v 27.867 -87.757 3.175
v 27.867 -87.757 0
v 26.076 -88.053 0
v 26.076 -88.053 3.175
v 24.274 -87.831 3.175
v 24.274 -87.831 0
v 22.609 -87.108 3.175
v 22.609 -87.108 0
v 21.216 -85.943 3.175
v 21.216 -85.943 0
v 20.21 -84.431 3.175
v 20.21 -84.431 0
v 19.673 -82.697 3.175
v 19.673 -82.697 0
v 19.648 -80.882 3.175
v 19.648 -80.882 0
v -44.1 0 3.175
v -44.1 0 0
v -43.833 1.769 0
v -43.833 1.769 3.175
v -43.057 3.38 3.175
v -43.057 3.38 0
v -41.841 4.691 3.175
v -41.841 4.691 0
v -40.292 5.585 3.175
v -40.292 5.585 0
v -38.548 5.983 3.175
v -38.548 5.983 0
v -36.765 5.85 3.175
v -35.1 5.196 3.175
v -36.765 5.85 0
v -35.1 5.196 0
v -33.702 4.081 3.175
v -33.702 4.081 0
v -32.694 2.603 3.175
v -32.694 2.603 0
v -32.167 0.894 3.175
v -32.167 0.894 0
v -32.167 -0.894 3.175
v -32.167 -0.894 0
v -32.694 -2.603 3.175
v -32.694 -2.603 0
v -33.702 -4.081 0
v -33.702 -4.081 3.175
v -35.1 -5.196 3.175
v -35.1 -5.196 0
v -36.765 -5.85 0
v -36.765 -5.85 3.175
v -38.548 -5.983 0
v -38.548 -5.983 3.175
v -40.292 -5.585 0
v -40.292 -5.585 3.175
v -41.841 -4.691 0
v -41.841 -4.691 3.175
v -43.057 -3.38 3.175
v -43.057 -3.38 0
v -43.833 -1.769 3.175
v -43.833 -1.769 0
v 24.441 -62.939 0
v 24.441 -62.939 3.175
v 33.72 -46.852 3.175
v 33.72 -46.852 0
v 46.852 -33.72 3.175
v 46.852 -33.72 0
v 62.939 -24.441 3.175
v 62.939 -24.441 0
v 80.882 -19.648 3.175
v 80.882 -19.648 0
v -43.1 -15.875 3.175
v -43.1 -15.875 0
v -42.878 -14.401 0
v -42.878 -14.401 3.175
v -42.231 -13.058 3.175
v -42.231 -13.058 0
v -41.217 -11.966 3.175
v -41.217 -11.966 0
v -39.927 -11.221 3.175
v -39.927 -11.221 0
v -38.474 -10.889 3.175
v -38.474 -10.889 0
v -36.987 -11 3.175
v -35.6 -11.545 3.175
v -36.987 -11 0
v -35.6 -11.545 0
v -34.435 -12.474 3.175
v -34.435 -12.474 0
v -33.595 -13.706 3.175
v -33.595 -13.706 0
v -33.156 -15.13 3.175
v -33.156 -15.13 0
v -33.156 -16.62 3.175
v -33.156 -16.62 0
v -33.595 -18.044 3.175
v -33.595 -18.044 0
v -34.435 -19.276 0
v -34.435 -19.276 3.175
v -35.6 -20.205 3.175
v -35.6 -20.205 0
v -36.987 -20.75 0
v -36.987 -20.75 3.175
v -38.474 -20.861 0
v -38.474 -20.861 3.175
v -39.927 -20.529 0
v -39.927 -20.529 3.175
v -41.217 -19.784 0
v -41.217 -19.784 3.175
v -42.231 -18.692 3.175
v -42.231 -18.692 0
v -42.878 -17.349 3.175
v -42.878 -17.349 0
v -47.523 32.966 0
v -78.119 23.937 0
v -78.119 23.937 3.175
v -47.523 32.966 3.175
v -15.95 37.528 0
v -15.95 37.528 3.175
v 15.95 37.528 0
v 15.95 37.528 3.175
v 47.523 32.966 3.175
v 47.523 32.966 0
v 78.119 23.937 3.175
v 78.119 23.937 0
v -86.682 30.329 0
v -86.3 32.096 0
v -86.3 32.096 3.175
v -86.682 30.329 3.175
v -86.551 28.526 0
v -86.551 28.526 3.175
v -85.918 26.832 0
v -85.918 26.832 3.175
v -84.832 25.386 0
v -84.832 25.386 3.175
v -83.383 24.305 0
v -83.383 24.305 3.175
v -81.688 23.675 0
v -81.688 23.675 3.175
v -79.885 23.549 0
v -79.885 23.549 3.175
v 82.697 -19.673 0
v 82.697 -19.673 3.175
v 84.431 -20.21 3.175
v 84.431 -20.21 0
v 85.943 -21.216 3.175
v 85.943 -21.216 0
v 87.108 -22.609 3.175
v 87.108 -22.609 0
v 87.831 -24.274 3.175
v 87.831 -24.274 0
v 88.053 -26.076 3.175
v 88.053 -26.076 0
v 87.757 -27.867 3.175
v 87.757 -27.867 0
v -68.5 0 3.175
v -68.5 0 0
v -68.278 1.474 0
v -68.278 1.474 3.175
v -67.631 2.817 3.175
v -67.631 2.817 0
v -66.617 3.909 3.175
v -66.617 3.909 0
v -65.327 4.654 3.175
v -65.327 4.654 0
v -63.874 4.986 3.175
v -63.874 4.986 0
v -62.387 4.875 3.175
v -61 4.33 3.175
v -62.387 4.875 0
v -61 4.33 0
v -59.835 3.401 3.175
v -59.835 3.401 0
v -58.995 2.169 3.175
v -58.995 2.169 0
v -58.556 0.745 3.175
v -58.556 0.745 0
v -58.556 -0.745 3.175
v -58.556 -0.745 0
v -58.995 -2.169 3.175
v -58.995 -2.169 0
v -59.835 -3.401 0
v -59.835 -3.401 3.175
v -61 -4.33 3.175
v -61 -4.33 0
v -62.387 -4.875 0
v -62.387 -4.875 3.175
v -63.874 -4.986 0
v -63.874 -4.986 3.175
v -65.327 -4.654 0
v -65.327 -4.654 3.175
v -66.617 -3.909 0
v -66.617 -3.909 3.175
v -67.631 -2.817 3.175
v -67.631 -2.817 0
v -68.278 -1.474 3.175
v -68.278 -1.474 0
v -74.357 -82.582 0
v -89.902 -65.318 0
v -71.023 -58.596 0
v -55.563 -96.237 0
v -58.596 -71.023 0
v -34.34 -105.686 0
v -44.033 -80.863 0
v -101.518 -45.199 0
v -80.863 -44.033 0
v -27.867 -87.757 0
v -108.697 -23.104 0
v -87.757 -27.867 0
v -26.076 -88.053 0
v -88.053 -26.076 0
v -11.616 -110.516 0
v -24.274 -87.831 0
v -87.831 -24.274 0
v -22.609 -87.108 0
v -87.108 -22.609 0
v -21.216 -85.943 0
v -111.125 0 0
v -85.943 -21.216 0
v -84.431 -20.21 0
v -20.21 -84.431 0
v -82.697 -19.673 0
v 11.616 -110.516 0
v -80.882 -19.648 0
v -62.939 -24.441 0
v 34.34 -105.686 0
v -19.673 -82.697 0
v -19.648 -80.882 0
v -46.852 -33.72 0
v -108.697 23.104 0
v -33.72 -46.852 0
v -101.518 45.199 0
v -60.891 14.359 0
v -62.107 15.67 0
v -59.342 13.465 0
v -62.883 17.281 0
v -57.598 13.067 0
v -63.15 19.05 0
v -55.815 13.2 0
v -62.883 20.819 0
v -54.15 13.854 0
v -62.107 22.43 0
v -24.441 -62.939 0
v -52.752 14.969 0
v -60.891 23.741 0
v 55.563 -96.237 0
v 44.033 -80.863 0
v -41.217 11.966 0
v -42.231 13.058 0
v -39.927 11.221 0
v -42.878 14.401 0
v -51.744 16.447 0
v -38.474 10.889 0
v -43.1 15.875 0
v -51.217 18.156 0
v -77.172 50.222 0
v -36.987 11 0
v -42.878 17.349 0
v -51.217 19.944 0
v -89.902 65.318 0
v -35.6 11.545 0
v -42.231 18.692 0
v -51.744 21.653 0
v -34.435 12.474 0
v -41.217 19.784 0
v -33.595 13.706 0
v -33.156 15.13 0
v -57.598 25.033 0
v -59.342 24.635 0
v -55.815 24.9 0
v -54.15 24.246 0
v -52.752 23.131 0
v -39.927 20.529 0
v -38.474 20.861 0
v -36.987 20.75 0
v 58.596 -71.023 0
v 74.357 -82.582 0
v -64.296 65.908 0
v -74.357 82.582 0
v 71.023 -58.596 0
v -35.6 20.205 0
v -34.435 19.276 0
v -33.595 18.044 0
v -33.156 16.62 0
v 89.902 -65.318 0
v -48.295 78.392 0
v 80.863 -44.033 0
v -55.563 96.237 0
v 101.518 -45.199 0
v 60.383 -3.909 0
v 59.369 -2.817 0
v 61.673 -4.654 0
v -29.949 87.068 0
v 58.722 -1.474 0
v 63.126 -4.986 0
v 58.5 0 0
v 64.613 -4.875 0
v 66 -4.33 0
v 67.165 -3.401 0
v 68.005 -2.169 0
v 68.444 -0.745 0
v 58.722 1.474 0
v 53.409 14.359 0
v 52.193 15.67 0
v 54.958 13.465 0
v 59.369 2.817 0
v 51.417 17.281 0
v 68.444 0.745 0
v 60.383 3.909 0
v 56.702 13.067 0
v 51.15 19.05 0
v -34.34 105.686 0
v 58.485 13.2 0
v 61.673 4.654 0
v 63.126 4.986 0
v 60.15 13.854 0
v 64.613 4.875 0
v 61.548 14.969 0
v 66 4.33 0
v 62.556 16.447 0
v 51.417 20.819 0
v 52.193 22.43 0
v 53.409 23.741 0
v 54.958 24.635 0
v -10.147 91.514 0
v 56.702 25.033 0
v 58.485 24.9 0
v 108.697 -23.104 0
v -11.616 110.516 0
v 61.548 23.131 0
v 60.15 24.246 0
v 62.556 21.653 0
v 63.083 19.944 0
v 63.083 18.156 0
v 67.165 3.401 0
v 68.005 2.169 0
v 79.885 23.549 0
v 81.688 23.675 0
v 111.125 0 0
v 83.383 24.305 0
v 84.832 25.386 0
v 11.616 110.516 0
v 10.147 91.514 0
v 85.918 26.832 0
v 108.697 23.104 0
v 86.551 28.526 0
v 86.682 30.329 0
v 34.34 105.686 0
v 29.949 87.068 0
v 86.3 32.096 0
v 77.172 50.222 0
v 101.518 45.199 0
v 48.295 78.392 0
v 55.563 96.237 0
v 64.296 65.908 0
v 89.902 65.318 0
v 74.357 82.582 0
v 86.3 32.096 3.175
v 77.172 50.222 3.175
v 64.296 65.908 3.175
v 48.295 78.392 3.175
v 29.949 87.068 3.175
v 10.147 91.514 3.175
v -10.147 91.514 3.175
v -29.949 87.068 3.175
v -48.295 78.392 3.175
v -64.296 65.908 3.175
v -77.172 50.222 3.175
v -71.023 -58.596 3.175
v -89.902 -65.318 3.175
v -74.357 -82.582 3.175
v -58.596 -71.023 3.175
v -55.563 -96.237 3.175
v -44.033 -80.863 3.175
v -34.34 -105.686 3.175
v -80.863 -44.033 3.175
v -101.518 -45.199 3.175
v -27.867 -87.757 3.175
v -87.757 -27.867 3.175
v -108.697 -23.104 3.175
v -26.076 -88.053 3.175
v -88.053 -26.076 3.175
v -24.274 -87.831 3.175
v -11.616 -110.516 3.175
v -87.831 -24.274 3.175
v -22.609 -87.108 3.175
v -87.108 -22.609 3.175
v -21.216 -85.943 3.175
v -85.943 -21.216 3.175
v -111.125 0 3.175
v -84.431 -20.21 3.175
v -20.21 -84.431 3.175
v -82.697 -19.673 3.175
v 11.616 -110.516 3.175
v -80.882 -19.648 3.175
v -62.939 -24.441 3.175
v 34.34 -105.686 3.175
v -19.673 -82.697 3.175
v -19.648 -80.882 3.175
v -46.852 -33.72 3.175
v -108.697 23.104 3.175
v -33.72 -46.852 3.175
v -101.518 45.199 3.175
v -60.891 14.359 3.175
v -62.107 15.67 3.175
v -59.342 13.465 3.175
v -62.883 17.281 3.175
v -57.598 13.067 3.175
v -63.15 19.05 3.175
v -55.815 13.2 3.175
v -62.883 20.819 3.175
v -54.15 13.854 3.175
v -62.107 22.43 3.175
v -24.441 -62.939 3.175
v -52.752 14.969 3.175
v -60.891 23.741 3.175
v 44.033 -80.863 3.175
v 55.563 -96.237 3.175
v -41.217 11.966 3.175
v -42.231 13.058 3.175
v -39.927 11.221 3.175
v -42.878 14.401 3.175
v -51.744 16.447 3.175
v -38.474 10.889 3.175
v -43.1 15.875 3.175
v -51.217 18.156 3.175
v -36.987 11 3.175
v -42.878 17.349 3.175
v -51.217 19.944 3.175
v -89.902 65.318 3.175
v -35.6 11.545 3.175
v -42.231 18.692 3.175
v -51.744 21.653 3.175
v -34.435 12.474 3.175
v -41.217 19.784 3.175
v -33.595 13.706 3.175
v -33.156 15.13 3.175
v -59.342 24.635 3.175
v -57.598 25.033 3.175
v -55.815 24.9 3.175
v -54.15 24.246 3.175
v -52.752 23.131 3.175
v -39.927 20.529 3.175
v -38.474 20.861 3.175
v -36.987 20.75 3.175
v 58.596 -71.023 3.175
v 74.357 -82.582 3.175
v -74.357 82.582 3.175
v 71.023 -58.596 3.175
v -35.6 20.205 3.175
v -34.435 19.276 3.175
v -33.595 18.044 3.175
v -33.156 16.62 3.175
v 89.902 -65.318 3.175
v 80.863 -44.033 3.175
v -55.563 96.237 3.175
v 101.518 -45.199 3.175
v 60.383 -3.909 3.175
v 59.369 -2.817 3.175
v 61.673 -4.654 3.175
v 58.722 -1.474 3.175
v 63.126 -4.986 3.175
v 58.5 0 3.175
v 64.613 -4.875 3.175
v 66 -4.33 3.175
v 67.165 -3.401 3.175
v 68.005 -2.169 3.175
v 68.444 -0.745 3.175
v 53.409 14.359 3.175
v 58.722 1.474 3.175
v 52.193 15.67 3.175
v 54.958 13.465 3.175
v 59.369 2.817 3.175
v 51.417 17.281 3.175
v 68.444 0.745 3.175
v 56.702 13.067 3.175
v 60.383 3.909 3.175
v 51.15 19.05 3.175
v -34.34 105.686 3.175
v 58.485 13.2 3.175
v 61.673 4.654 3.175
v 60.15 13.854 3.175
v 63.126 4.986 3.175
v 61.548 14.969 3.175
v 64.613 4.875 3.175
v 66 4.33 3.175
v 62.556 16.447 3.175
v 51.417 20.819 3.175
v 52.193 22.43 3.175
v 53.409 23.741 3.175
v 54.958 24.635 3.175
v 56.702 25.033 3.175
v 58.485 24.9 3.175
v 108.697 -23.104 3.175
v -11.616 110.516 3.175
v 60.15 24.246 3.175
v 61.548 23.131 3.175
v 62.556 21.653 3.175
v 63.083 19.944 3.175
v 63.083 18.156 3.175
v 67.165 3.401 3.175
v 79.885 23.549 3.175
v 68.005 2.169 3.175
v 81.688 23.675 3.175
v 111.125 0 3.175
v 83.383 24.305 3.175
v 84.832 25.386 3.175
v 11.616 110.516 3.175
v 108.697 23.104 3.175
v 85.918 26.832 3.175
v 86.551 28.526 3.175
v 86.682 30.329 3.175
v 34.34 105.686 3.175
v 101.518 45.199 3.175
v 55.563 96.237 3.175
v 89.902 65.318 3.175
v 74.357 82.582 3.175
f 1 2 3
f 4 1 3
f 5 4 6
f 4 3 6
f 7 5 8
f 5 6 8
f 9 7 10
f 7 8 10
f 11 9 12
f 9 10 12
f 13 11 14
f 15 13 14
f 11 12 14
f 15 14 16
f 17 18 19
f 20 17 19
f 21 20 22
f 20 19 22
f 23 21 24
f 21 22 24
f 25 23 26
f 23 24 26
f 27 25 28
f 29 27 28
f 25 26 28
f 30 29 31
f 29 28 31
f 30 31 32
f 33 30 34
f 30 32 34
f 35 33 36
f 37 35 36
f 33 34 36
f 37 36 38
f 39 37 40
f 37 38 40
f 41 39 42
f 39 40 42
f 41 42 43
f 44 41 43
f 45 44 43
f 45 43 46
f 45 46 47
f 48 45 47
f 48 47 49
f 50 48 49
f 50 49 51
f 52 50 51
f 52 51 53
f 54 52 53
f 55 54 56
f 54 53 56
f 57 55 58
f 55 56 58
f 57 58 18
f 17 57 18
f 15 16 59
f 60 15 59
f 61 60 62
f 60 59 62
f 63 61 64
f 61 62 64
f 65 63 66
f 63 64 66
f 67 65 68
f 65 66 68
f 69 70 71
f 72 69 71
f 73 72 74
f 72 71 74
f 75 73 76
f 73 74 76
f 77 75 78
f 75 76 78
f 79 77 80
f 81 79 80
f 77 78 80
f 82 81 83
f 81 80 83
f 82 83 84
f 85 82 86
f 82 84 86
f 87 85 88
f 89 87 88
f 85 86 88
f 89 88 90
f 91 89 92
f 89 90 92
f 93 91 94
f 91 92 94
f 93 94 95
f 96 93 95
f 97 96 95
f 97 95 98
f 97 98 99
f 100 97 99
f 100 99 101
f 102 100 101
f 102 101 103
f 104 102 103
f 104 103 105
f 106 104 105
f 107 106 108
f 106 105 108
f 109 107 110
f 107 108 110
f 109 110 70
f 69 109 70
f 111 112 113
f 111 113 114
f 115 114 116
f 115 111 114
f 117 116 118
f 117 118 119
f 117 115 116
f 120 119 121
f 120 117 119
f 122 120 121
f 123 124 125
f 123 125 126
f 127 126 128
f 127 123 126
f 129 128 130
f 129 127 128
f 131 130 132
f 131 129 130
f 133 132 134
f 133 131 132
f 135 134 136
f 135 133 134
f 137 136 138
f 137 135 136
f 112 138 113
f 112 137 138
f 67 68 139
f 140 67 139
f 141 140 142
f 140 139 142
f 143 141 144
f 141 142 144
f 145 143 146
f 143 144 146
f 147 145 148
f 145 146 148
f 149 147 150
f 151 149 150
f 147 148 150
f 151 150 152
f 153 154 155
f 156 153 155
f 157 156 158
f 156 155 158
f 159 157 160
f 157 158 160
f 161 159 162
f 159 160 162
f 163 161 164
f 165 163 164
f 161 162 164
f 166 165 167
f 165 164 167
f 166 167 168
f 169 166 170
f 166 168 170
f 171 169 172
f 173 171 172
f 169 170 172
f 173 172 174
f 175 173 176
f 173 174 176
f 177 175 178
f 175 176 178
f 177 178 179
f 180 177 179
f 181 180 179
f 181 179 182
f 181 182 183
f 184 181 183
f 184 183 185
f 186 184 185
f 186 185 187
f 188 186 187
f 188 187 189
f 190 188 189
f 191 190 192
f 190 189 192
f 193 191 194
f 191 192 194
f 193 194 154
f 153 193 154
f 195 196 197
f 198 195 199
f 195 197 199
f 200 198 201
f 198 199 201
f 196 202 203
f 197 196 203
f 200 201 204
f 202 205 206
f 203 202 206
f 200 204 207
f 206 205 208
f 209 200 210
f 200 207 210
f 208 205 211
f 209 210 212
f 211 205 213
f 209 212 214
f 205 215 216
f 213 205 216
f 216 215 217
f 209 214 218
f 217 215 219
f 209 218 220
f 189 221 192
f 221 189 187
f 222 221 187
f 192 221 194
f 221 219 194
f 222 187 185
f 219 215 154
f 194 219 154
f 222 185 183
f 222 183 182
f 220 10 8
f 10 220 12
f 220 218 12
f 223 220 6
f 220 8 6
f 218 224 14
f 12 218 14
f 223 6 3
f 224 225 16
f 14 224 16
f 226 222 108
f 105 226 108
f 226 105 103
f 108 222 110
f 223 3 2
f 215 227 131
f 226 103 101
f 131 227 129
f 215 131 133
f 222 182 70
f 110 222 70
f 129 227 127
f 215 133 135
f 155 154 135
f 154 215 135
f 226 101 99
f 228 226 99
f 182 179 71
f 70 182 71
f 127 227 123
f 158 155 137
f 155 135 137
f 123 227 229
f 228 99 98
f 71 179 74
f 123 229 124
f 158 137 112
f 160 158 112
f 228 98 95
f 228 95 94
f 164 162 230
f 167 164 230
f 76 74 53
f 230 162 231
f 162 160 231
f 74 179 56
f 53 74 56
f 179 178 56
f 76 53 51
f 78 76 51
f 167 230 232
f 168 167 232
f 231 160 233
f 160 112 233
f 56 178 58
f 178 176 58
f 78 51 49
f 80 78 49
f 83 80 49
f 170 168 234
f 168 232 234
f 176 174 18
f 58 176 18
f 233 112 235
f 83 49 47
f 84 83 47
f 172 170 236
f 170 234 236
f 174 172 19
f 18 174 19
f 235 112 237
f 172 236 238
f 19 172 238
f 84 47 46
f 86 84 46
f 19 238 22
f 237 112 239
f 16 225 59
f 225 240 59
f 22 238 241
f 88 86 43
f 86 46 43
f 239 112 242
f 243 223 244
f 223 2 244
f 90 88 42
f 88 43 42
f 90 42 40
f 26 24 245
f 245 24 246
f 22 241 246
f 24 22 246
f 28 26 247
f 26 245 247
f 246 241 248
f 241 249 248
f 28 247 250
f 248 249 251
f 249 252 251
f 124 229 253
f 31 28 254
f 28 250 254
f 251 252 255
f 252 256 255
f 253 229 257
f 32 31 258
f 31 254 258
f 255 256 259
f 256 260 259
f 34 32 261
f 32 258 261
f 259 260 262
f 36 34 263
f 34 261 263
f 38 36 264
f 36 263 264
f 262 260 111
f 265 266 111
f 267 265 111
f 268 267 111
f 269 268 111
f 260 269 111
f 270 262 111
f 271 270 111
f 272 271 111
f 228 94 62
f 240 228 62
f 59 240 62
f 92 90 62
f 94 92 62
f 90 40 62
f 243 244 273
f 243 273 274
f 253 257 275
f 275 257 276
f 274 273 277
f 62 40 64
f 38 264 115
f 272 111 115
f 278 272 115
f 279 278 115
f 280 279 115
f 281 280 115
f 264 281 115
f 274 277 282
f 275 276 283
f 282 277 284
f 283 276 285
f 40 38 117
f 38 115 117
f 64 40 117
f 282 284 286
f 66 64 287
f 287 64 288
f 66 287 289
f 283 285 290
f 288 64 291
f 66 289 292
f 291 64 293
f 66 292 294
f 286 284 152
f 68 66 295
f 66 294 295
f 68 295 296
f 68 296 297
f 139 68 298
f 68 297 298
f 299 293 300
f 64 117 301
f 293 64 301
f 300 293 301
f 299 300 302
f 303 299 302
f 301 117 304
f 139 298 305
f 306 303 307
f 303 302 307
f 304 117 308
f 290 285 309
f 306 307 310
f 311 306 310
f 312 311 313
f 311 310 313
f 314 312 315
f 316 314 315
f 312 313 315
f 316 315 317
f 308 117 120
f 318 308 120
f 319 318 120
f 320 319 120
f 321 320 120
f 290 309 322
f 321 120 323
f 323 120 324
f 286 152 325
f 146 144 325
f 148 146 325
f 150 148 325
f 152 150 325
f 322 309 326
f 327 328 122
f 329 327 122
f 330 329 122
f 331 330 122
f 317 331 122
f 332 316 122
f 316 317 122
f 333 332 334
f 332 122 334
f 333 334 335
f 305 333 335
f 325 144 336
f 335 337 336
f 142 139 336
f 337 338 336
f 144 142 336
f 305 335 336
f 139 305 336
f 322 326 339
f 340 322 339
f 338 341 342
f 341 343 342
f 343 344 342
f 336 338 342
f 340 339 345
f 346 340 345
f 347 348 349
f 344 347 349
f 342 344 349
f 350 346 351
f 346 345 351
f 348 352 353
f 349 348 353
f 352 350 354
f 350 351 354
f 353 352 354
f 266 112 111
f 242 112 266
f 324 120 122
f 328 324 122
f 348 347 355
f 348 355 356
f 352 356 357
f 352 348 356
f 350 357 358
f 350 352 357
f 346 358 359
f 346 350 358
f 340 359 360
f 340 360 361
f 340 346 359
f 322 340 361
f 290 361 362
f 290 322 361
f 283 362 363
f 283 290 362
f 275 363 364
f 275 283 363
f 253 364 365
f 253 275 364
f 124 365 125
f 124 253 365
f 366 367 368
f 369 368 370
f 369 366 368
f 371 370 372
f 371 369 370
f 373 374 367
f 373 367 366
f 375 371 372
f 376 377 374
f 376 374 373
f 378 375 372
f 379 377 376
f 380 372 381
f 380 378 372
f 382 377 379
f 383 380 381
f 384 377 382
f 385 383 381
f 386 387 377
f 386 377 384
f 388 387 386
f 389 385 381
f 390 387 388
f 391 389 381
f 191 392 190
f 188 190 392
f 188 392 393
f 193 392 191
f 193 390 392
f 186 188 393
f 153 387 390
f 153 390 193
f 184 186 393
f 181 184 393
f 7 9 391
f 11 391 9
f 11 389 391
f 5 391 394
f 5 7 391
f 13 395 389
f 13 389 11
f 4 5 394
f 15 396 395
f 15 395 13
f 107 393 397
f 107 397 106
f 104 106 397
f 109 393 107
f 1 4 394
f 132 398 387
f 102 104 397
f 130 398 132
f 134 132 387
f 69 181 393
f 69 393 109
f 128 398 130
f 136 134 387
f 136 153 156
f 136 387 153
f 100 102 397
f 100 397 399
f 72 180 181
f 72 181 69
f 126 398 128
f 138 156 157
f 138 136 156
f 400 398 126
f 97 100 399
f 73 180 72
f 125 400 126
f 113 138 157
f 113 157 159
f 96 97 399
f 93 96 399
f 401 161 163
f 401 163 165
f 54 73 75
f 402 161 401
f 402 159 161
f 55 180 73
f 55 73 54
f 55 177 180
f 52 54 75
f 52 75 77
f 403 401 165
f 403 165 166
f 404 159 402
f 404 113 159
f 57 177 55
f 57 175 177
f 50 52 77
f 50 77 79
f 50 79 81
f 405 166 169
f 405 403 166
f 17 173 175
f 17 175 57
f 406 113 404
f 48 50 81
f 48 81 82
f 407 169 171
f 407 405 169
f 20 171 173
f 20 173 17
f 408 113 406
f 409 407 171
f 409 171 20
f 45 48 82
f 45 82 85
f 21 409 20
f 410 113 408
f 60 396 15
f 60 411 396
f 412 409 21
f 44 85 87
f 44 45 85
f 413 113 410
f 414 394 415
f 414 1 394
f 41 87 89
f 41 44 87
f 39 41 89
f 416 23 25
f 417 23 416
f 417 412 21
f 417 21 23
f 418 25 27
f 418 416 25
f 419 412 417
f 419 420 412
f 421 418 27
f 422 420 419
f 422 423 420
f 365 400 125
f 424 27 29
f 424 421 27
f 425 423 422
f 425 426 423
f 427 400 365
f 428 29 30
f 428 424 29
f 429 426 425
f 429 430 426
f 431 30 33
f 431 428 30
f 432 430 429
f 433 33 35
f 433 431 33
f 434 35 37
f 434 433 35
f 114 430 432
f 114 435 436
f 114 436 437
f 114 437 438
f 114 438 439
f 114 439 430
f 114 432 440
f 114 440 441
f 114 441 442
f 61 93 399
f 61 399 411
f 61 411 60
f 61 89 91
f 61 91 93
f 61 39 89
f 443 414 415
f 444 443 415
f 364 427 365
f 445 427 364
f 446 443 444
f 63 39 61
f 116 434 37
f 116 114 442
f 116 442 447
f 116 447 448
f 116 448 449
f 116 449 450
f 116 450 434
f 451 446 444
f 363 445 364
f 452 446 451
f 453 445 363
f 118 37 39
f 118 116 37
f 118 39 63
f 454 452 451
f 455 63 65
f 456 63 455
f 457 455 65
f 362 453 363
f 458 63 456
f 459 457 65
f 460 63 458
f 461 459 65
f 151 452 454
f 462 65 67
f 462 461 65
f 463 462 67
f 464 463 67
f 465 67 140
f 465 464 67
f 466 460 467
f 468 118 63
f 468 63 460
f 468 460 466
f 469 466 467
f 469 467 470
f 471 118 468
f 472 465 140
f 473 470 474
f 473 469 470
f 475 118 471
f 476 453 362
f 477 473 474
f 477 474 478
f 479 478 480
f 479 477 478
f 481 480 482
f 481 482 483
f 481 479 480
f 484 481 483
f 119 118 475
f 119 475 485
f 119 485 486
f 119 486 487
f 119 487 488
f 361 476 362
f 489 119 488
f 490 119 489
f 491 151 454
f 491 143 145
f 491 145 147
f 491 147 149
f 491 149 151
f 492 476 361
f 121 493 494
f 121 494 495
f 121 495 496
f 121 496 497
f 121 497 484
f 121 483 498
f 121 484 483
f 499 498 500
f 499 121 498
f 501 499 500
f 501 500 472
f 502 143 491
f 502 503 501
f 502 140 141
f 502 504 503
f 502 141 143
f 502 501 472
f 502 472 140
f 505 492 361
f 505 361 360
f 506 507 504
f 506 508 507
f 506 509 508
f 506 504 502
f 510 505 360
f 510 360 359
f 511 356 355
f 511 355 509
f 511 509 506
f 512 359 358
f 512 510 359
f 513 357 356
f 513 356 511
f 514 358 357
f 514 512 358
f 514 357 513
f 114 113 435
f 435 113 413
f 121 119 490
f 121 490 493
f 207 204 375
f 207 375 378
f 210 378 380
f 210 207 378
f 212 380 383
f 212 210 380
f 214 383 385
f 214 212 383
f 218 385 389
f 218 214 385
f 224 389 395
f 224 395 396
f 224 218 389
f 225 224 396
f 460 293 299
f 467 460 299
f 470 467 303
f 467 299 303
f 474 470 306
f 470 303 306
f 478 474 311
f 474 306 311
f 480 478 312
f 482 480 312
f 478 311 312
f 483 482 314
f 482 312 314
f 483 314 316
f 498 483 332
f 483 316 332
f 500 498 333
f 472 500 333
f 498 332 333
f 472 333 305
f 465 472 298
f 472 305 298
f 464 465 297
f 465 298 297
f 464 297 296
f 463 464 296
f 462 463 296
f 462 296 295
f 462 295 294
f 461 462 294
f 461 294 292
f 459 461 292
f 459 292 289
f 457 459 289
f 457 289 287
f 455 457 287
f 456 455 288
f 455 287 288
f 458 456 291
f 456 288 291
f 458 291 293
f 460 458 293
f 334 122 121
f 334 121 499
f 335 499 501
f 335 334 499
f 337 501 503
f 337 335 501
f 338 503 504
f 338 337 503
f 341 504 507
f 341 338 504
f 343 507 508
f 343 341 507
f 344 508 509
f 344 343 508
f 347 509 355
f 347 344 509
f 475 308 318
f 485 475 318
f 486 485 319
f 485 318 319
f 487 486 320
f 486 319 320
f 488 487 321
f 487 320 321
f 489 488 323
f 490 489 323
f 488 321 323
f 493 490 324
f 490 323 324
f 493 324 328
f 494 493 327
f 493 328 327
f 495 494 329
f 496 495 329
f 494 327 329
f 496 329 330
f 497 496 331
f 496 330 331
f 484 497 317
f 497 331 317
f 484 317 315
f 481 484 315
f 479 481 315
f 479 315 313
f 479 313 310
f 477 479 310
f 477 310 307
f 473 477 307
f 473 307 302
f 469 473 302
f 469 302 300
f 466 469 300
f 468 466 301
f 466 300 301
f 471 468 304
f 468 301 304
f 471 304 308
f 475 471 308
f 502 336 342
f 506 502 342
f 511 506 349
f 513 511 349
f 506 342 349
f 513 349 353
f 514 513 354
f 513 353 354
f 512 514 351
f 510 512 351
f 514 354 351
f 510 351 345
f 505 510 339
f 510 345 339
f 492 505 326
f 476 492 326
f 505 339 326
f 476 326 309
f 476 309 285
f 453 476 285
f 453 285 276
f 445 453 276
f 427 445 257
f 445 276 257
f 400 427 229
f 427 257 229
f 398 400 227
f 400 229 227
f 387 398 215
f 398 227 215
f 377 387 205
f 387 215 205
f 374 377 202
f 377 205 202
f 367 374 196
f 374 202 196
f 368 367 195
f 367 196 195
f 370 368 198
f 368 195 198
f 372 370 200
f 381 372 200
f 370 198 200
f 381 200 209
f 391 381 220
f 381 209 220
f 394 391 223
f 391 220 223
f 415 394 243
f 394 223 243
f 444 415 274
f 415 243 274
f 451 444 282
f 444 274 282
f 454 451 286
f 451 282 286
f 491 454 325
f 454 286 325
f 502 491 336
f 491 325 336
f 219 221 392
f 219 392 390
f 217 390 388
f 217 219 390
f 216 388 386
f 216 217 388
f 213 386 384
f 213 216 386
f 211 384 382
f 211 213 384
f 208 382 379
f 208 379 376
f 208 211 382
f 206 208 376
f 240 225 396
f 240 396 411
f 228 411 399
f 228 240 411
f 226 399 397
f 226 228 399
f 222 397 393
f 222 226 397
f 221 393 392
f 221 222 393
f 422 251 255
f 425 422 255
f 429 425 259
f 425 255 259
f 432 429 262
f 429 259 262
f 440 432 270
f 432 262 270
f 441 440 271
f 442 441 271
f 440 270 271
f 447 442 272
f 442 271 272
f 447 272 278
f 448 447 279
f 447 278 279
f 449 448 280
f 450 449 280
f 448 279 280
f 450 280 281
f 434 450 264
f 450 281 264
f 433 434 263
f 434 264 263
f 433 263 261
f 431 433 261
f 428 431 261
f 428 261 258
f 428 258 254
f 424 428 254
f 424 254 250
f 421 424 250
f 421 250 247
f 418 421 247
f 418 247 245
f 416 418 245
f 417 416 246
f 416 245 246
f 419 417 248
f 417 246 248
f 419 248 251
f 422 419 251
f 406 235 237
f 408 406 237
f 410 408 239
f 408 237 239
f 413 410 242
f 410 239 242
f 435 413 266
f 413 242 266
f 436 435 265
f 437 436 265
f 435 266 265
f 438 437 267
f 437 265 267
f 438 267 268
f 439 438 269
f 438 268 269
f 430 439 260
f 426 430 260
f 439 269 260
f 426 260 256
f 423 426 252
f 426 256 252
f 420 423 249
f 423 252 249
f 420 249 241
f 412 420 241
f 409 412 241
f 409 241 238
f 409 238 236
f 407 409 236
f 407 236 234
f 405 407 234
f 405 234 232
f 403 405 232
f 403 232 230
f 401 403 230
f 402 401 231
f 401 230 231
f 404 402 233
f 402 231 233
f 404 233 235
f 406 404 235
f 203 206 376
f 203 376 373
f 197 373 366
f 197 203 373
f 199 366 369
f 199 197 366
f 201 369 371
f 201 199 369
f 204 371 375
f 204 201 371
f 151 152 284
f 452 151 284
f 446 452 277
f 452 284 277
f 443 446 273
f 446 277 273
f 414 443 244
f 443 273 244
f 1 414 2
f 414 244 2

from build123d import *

# Parameters (mm, degrees)
SKETCH1_R           = 111.125
BOSS_EXTRUDE1_DEPTH = 3.175
SKETCH2_R           = 5.999999938
SKETCH2_R_2         = 5.000000033
CUT_EXTRUDE1_DEPTH  = 3.175


with BuildPart() as part:
    # Sketch1 → Boss-Extrude1 (new body)
    with BuildSketch(Plane.XY):
        Circle(SKETCH1_R)
        with BuildLine():
            ThreePointArc((-78.118809332, 23.936541993), (0, 38.1), (78.118809332, 23.936541993))
            ThreePointArc((78.118809332, 23.936541993), (84.832280885, 25.386264259), (86.299834064, 32.095860566))
            ThreePointArc((86.299834064, 32.095860566), (0, 92.075), (-86.299834064, 32.095860566))
            ThreePointArc((-86.299834064, 32.095860566), (-84.832280885, 25.386264259), (-78.118809332, 23.936541993))
        make_face(mode=Mode.SUBTRACT)
        with BuildLine():
            ThreePointArc((19.648389698, -80.882079401), (39.855012865, -39.855012865), (80.882079401, -19.648389698))
            ThreePointArc((80.882079401, -19.648389698), (86.575177486, -21.870616714), (87.75676836, -27.866740606))
            ThreePointArc((87.75676836, -27.866740606), (65.106856878, -65.106856878), (27.866740606, -87.75676836))
            ThreePointArc((27.866740606, -87.75676836), (21.870616714, -86.575177486), (19.648389698, -80.882079401))
        make_face(mode=Mode.SUBTRACT)
        with BuildLine():
            ThreePointArc((-19.648389698, -80.882079401), (-39.855012865, -39.855012865), (-80.882079401, -19.648389698))
            ThreePointArc((-80.882079401, -19.648389698), (-86.575177486, -21.870616714), (-87.75676836, -27.866740606))
            ThreePointArc((-87.75676836, -27.866740606), (-65.106856878, -65.106856878), (-27.866740606, -87.75676836))
            ThreePointArc((-27.866740606, -87.75676836), (-21.870616714, -86.575177486), (-19.648389698, -80.882079401))
        make_face(mode=Mode.SUBTRACT)
    extrude(amount=BOSS_EXTRUDE1_DEPTH)

    # Sketch2 → Cut-Extrude1 (cut)
    with BuildSketch(Plane(origin=(0, 0, 0), x_dir=(-1, 0, 0), z_dir=(0, 0, -1))):
        with Locations((-57.15, 19.05)):
            Circle(SKETCH2_R)
        with Locations((-63.5, 0)):
            Circle(SKETCH2_R_2)
        with Locations((57.15, 19.05)):
            Circle(SKETCH2_R)
        with Locations((63.5, 0)):
            Circle(SKETCH2_R_2)
        with Locations((38.1, 0)):
            Circle(SKETCH2_R)
        with Locations((38.1, 15.875)):
            Circle(SKETCH2_R_2)
        with Locations((38.1, -15.875)):
            Circle(SKETCH2_R_2)
    extrude(amount=-CUT_EXTRUDE1_DEPTH, mode=Mode.SUBTRACT)


solid = part.part
